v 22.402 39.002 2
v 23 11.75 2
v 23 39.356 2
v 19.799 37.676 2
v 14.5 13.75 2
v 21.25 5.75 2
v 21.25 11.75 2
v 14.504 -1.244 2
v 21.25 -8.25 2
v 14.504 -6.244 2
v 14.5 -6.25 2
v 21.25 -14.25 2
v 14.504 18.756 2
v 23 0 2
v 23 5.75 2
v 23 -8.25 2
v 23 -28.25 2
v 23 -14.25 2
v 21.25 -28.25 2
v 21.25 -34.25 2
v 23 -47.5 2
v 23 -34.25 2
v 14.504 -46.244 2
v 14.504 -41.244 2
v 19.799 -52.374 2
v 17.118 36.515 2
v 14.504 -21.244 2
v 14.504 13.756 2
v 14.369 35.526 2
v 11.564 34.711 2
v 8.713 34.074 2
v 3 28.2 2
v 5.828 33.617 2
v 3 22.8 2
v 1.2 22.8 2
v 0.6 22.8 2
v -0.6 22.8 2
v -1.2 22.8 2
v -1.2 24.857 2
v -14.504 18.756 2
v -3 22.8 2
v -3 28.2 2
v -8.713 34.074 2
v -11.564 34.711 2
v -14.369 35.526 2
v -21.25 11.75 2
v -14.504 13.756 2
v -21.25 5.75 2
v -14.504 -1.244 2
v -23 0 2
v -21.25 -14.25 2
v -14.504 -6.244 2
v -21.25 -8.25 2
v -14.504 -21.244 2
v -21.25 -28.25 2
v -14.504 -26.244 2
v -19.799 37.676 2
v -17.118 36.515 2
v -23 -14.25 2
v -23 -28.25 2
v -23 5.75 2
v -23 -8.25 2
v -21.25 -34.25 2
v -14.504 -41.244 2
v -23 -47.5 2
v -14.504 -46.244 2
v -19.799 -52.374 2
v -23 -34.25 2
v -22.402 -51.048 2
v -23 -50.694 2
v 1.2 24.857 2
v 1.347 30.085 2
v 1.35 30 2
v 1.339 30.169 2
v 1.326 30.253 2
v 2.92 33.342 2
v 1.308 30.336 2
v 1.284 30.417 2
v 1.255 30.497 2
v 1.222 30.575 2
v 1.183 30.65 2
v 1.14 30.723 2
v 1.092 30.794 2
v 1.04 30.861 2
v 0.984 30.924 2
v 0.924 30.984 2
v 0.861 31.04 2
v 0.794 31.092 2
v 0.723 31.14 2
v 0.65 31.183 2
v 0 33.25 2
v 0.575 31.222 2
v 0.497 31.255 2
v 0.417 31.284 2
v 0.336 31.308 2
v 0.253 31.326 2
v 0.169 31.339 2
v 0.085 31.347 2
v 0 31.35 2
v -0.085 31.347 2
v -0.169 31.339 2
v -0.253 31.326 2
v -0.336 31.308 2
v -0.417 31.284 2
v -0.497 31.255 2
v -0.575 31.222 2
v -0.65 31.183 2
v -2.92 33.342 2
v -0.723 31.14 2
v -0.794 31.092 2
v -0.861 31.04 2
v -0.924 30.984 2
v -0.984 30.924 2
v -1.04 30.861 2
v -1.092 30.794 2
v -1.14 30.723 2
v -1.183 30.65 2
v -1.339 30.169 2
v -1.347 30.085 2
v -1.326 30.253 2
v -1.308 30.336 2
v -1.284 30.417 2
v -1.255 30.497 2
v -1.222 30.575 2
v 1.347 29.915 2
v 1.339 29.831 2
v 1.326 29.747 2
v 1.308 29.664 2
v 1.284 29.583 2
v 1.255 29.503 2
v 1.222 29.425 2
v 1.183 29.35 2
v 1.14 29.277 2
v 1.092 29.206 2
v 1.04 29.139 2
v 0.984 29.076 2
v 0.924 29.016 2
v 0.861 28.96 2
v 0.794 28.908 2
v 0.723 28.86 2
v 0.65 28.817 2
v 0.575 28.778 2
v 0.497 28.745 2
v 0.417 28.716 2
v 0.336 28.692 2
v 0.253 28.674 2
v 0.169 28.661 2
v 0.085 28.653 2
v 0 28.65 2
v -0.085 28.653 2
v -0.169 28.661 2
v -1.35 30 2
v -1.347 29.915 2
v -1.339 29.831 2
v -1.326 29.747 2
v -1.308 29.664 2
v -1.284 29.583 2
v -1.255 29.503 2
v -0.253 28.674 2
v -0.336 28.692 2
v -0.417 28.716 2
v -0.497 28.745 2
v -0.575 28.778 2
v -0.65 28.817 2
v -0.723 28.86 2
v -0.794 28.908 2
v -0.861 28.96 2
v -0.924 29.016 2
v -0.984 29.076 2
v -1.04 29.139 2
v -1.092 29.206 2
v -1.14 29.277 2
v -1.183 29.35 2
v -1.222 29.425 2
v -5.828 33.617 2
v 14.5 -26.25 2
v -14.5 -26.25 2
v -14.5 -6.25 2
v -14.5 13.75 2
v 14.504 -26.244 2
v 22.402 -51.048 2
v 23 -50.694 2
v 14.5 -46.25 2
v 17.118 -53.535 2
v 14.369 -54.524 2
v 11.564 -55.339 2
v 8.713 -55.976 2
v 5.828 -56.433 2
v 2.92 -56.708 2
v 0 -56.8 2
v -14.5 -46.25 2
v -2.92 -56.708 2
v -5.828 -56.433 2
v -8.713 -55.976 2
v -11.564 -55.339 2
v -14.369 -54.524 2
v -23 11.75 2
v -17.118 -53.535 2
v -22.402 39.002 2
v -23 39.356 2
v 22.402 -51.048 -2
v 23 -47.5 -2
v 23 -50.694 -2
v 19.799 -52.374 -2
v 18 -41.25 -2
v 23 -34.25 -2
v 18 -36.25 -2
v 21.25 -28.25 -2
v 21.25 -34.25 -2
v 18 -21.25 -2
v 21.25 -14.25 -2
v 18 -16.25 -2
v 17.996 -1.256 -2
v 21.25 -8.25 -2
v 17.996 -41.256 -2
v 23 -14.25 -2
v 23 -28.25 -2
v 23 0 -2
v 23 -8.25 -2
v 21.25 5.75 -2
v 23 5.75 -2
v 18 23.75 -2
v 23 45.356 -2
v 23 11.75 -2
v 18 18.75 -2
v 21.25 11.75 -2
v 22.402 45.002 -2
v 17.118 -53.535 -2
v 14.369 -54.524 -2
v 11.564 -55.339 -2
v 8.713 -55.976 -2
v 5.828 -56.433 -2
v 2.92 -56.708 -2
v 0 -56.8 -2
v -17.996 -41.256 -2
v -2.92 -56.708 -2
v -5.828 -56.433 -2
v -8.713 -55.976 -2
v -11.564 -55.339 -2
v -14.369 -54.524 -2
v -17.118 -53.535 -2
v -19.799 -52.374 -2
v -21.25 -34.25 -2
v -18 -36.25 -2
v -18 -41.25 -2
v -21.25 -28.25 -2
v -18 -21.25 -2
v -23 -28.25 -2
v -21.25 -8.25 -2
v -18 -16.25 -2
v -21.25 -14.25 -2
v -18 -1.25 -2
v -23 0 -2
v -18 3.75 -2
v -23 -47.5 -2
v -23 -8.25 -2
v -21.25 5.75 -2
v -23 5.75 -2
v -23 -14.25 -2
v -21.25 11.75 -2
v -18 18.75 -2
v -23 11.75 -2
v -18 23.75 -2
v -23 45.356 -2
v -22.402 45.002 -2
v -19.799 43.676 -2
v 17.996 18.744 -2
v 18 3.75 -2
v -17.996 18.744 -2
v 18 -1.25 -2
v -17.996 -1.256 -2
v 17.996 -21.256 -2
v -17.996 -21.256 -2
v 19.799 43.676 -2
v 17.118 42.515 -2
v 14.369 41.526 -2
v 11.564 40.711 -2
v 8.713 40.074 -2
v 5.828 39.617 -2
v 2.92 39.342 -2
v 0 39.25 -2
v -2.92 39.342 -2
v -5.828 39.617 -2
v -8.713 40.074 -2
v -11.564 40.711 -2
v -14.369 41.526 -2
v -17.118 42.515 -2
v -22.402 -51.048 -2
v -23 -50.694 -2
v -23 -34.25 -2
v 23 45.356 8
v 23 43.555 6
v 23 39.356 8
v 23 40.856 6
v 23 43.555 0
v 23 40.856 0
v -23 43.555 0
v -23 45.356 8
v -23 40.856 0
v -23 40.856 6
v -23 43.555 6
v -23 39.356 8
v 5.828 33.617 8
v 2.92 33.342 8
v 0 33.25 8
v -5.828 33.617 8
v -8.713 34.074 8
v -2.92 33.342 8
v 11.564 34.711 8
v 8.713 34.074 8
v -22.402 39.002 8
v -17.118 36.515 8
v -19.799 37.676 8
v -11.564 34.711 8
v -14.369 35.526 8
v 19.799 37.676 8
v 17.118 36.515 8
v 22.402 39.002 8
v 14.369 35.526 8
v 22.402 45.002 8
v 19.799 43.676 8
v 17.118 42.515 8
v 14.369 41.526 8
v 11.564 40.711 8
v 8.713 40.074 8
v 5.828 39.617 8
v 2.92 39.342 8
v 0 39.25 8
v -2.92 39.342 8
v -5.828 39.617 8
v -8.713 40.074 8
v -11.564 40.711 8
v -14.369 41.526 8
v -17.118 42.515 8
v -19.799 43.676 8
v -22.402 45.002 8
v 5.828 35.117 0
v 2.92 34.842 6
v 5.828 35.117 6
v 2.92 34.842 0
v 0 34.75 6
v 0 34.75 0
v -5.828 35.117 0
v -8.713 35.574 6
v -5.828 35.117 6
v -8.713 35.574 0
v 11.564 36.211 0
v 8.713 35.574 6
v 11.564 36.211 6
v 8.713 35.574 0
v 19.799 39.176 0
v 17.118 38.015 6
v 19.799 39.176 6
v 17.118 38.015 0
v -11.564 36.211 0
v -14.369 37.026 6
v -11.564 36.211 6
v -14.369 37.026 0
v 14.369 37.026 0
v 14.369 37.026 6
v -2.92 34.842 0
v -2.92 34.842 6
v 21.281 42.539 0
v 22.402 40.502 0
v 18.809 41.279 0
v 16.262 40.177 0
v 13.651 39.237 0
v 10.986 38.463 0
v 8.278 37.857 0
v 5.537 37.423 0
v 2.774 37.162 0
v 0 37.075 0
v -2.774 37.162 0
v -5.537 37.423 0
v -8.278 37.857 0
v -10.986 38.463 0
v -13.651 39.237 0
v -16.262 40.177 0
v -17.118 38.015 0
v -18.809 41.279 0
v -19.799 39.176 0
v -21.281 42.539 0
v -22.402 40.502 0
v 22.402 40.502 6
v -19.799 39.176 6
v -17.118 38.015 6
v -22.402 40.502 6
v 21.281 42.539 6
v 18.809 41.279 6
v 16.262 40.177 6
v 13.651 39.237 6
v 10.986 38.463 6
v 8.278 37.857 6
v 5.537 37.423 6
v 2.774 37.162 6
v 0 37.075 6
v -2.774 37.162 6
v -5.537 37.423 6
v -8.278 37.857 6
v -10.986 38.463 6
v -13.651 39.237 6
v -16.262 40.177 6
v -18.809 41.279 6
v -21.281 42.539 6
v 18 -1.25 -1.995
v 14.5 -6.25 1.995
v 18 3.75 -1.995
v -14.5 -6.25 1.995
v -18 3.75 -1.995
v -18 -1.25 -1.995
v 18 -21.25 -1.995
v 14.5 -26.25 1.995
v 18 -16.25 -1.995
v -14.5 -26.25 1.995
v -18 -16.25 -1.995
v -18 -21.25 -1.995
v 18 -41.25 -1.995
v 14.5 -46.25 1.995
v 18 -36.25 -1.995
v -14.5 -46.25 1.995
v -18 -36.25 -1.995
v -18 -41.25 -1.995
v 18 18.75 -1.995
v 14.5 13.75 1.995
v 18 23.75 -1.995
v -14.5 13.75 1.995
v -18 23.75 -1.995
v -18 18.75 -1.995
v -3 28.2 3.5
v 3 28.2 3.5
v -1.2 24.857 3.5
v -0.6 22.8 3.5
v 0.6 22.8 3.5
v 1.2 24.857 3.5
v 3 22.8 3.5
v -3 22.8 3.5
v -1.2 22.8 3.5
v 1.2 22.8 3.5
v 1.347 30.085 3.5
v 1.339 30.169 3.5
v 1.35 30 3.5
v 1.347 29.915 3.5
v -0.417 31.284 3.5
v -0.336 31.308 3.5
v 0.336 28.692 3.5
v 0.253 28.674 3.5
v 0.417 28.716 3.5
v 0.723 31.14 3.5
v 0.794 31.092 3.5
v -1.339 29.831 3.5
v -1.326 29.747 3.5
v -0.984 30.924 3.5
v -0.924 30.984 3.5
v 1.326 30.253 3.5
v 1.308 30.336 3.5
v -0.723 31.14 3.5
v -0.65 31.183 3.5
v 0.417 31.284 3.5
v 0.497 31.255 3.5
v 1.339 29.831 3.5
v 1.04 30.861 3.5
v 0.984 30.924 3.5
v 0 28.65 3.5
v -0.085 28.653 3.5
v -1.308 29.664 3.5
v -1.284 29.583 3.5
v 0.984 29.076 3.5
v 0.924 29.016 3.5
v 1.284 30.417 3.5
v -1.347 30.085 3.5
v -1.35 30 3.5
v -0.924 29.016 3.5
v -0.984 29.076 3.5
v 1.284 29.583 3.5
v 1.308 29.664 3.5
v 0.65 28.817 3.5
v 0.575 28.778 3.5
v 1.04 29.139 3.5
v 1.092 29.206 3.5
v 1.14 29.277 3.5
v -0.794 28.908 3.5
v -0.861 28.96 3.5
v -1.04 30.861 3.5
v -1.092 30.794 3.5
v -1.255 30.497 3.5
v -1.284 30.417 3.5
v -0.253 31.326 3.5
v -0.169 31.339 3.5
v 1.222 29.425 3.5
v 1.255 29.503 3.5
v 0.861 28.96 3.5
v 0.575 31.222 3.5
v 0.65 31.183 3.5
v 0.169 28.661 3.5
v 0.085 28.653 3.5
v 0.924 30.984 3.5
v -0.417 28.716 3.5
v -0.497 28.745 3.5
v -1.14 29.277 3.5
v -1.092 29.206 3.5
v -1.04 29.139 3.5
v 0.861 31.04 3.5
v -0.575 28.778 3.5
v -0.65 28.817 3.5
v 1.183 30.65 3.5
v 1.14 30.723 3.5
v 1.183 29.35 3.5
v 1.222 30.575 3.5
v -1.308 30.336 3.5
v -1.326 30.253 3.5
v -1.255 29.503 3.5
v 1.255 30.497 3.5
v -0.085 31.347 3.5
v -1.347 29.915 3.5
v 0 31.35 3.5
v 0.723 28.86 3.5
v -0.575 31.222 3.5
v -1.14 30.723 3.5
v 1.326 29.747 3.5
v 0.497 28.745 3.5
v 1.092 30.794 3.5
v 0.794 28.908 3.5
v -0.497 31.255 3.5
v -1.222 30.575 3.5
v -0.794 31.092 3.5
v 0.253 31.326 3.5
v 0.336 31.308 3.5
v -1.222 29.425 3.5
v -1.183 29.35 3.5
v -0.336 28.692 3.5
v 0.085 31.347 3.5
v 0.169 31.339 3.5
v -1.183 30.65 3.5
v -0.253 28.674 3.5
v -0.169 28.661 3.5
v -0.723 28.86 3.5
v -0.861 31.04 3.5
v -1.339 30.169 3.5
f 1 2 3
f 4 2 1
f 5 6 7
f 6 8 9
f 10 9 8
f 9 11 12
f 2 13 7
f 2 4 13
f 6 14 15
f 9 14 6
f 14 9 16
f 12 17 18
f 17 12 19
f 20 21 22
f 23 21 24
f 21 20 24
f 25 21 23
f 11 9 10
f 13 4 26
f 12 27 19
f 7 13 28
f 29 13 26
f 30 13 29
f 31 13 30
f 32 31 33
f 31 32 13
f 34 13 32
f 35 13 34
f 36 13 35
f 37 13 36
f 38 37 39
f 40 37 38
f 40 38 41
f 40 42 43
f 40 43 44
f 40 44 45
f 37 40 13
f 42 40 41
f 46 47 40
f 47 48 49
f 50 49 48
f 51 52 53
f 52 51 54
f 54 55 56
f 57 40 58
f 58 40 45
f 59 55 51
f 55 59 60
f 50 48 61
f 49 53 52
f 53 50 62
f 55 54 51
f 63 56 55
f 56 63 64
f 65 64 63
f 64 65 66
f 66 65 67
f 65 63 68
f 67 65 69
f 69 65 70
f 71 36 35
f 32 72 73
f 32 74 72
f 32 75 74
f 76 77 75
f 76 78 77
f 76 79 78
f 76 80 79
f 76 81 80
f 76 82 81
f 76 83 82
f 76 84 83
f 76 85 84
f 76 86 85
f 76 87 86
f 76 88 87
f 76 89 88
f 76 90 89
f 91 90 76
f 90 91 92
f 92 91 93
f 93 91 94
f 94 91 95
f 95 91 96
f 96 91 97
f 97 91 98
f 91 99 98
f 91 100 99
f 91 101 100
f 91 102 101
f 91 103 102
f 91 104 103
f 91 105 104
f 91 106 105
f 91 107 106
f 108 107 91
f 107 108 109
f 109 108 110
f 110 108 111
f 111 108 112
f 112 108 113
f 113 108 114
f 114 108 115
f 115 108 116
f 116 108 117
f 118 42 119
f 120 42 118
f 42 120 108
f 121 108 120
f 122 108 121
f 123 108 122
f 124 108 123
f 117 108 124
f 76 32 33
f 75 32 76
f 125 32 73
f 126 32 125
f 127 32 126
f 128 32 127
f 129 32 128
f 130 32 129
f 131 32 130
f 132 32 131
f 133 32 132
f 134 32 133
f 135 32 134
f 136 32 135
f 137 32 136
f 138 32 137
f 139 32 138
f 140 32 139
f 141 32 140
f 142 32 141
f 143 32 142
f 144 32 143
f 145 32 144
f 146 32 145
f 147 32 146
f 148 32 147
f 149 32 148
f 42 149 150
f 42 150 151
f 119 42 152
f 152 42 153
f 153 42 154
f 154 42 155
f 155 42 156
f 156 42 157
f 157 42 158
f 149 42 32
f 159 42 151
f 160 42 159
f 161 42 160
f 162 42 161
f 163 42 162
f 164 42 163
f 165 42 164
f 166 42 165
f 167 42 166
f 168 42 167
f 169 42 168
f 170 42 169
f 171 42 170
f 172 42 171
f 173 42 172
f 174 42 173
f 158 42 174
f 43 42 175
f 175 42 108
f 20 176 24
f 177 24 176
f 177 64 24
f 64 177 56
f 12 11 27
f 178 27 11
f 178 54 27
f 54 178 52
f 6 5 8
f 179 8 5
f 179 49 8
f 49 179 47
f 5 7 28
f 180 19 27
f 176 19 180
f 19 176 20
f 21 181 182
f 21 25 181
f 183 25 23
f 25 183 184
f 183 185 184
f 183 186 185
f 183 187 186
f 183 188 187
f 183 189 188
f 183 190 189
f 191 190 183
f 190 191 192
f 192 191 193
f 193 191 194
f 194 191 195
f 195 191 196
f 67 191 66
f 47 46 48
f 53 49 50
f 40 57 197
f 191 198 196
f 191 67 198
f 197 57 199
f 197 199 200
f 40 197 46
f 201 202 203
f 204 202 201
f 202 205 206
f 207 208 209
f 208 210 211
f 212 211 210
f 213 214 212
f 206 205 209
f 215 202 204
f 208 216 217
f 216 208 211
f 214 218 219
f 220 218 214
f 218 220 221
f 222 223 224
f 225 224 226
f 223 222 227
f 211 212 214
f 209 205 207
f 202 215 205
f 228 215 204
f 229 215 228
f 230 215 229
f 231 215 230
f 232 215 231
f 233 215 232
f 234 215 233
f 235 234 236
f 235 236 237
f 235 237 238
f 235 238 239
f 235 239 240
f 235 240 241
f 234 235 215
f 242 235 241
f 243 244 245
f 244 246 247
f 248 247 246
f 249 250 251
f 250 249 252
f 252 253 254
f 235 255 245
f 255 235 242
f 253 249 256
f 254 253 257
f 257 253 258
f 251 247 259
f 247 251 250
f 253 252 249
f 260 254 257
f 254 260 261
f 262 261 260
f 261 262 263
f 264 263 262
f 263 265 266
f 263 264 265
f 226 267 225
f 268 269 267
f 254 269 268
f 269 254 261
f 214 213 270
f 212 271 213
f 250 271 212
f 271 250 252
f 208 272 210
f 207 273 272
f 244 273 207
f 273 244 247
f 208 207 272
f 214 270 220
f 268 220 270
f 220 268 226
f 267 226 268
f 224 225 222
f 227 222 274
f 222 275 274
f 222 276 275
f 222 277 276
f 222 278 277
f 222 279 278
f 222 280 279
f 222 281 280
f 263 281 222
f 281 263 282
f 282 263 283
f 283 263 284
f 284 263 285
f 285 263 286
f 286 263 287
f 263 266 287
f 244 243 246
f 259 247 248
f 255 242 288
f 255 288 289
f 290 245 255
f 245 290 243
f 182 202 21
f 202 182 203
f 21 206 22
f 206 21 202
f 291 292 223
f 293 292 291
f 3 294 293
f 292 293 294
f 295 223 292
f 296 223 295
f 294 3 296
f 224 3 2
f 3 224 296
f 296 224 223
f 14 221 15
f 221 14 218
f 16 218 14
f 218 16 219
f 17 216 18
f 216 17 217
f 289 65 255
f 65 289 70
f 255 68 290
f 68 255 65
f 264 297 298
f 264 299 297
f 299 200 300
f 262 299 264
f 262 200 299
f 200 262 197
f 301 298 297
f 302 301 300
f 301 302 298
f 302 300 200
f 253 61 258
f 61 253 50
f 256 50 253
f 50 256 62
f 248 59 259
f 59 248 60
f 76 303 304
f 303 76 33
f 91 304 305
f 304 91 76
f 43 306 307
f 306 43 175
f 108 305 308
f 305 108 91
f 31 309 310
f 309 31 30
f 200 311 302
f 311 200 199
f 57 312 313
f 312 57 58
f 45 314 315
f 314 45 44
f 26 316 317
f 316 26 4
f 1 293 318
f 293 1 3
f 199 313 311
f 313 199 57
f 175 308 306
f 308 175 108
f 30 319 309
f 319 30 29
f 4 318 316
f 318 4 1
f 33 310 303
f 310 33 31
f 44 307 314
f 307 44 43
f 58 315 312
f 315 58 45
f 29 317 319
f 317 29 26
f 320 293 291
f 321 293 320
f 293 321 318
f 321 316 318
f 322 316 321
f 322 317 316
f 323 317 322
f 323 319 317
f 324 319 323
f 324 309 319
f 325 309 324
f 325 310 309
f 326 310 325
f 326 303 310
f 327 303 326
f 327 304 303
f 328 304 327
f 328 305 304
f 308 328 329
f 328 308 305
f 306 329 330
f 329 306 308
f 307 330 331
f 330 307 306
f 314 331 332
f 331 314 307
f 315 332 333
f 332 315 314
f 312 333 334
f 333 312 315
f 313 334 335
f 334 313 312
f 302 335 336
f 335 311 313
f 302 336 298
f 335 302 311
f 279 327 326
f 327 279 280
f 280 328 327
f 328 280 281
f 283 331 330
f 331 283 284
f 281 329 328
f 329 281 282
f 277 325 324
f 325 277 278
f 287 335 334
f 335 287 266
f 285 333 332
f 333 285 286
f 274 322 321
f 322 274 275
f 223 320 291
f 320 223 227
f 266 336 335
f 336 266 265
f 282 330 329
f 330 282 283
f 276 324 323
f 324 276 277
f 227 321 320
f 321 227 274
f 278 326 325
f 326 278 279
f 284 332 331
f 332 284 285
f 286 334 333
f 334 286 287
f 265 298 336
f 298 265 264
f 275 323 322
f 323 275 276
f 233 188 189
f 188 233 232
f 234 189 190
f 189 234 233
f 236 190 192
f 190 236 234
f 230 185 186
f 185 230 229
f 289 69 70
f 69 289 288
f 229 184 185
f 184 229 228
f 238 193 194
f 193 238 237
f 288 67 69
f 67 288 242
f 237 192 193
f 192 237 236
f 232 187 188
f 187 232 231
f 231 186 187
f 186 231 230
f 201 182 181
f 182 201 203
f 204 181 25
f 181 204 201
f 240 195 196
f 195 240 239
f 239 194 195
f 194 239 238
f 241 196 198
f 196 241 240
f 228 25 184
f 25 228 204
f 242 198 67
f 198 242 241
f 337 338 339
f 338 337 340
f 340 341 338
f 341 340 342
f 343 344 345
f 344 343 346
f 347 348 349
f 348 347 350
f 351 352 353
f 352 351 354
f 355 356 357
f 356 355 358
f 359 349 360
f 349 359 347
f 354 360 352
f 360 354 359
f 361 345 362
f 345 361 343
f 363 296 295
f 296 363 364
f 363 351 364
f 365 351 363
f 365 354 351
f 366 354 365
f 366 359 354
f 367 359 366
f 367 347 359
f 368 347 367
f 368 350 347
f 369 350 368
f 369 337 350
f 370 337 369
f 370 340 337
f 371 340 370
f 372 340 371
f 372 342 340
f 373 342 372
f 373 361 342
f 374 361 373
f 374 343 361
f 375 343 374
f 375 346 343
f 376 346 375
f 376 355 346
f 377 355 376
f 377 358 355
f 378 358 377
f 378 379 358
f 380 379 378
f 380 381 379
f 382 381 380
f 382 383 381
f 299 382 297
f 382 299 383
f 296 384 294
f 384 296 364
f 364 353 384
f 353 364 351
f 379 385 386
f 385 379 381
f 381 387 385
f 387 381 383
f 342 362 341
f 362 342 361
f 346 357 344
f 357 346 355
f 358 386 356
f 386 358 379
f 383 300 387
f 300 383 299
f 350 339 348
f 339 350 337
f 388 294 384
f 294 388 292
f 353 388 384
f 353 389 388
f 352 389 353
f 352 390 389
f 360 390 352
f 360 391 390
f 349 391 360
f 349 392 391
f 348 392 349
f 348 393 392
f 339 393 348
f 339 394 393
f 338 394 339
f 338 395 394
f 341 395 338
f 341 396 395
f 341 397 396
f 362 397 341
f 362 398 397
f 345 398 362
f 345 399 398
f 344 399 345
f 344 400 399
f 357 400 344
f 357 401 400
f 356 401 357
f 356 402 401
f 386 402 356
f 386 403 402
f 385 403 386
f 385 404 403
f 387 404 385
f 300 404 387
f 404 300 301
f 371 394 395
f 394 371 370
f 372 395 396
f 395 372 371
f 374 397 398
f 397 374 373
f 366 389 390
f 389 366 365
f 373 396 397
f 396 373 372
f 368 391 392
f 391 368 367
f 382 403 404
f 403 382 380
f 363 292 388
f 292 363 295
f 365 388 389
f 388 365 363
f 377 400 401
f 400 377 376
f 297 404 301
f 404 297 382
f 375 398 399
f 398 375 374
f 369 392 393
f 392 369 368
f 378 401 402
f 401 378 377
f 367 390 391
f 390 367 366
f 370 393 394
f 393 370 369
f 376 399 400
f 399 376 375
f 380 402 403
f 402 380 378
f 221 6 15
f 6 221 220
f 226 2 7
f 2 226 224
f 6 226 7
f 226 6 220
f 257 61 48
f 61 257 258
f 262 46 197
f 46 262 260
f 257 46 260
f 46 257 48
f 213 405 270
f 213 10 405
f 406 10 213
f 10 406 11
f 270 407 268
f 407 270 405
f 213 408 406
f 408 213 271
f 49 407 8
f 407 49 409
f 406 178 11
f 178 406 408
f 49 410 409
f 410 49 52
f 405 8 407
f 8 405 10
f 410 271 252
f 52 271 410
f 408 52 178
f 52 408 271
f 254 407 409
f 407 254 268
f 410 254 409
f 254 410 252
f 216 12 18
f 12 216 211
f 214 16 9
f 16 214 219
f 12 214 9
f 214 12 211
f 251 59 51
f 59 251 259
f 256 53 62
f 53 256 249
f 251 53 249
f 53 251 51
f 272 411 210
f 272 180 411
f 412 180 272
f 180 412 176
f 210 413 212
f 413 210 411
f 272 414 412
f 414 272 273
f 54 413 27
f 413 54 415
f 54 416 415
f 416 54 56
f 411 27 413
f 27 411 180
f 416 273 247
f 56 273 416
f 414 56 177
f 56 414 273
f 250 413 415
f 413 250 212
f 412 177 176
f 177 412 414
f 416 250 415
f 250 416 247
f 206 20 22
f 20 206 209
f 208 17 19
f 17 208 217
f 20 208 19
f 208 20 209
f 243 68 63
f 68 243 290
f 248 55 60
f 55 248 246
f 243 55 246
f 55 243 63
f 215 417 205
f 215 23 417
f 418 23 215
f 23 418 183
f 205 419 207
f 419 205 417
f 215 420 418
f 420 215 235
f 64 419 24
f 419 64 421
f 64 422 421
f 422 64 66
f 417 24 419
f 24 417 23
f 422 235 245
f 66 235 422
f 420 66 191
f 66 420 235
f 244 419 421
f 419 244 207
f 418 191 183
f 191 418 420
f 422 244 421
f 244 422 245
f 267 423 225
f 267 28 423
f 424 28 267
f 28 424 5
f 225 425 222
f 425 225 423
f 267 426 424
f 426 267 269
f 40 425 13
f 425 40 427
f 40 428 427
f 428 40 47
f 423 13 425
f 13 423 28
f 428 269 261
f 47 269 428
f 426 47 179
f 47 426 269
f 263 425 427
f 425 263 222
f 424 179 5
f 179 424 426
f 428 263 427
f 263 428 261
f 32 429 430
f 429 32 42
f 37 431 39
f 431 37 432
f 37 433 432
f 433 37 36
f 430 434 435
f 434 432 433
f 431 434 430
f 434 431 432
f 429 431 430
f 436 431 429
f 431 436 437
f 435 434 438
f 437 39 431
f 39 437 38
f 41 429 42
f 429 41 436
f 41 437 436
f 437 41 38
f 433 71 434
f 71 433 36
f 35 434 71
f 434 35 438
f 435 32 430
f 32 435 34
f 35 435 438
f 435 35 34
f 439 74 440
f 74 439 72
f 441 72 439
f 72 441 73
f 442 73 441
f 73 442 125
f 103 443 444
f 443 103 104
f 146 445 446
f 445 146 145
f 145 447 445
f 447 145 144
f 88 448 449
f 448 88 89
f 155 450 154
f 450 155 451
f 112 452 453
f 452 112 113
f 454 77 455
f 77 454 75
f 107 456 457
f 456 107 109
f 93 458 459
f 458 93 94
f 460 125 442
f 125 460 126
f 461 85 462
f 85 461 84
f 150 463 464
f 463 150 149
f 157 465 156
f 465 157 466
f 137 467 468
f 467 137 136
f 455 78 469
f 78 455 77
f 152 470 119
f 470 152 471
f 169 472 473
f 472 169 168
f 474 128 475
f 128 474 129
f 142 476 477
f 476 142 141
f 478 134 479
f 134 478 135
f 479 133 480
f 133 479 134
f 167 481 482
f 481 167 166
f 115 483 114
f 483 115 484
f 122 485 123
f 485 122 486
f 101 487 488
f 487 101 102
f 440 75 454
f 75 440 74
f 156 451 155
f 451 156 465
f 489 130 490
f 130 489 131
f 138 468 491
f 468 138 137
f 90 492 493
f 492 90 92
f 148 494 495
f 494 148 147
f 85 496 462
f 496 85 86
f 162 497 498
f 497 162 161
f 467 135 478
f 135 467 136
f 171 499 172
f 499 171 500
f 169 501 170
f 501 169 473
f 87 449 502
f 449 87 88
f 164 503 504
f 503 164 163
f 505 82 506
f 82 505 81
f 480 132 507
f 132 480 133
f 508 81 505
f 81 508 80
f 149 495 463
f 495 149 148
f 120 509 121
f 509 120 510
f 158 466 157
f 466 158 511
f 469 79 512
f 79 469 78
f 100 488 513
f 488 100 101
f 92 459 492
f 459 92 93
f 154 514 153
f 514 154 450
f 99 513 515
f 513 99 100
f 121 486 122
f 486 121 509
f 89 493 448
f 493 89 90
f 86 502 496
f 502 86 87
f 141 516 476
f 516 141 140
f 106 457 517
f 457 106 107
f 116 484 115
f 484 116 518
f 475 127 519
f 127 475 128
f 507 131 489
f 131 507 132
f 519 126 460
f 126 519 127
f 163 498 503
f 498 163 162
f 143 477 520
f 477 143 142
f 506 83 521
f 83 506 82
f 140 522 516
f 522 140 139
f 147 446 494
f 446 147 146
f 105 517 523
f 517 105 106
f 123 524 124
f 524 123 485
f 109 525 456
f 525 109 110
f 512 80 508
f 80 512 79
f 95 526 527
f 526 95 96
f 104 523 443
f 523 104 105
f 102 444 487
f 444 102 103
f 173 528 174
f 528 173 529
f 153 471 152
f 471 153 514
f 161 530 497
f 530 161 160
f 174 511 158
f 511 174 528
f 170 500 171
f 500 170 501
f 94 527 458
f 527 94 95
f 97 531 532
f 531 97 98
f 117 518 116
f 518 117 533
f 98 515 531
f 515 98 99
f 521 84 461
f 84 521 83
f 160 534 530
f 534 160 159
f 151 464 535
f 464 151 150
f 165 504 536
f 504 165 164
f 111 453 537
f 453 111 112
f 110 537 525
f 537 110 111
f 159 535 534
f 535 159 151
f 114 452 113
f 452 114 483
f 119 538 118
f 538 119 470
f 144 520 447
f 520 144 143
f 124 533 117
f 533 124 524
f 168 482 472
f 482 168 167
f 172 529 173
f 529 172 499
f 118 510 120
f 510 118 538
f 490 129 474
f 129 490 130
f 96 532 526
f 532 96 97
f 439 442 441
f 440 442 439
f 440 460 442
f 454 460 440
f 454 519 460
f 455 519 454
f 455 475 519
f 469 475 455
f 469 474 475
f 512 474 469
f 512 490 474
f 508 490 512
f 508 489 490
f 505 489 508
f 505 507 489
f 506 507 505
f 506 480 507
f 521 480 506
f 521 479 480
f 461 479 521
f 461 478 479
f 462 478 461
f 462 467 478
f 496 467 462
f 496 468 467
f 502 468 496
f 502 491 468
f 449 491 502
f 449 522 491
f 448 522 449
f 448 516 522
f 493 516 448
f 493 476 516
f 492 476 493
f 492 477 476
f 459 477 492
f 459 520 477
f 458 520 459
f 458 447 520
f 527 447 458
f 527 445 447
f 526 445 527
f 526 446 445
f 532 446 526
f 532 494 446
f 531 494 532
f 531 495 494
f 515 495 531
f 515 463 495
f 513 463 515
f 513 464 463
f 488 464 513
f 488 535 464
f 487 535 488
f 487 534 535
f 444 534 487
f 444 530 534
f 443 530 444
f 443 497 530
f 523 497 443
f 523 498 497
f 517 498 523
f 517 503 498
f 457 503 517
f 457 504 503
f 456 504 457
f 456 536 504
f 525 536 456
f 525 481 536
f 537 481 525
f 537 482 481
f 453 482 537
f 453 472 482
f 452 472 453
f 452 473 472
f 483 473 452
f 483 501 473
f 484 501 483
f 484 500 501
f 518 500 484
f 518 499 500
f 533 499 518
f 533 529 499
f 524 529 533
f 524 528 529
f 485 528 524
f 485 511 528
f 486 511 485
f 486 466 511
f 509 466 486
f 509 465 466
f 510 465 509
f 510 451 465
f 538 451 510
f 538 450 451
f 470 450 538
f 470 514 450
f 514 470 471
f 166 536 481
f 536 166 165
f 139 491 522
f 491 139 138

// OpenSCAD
$fn = 100;

gels = 4;
gel_width = 36; //431
gel_cut_width = 29;
gel_opening = 5;
gel_spacing = 15;

ladder_margin = 15;
ladder_length = gel_opening * gels + gel_spacing * (gels - 1) + ladder_margin * 2;
ladder_width = gel_width + gel_opening * 2;
ladder_thickness = 4;
ladder_round = 1;

stem_diameter = 46.5;
stem_radius = stem_diameter / 2;

zip_thickness = 1.5;
zip_width = 3.5;
zip_height = 6;

logo_head = 10;
logo_m_thick = 6;
logo_m_thin = 4;

module slot() {
    translate([0, 0, -(ladder_thickness / 2)]) {
        hull() {
            cube([gel_opening, gel_width, 0.01], true);
            translate([gel_opening, 0, ladder_thickness]) {
                cube([gel_opening, gel_cut_width, 0.01], true);
            }
        }
    }
}

module ladder() {
    difference() {
        union() {
            // initial ladder
            cube([ladder_length, ladder_width, ladder_thickness], true);
            
            // add on the front ring for the zip tie
            translate([-(ladder_length / 2 + stem_radius + ladder_margin) + zip_height, 0, zip_height / 2]) {
                    cylinder(ladder_thickness + zip_height, stem_diameter, stem_diameter, true);
            }        
        }
        
        translate([-(ladder_length / 2 + stem_radius + ladder_margin), 0, 0]) {
            cylinder(ladder_thickness * 5, stem_diameter, stem_diameter, true);
        }

        translate([-ladder_length, ladder_width, 0]) {
            cube([ladder_length * 2, ladder_width, ladder_thickness * 5], true);
        }

        translate([-ladder_length, -ladder_width, 0]) {
            cube([ladder_length * 2, ladder_width, ladder_thickness * 5], true);
        }
    }
    

    // round off the end of the ladder
    difference() {
        translate([ladder_length / 2 - stem_diameter * .8, 0, 0]) {
            cylinder(ladder_thickness, stem_diameter, stem_diameter, true);
        }
        translate([0, ladder_width, 0]) {
            cube([ladder_length * 10, ladder_width, ladder_thickness + .1], true);
        }
        translate([0, -ladder_width, 0]) {
            cube([ladder_length * 10, ladder_width, ladder_thickness + .1], true);
        }
    }

}

module stemzip() {
    difference() {
        cylinder(zip_height, stem_diameter, stem_diameter, true);
        scale([.95, .95, .95]) {
            cylinder(zip_height * 2, stem_diameter, stem_diameter, true);
        }
    }
}


// showtime!
module main() {
    difference() {
        ladder();
        translate([-(ladder_length / 2 + stem_radius + ladder_margin) + zip_height - zip_thickness, 0, zip_height / 2]) {
            stemzip();
        }    
        for (offset = [0: gels - 1]) {
            translate([(gel_opening + gel_spacing) * offset - ladder_length / 2 + ladder_margin * 1.75, 0, 0]) {
                slot();
                if (offset > 0) {
                    translate([- (gel_spacing / 2), ladder_width / 2, 0]) {
                        cube([zip_height, zip_width, ladder_thickness * 2], true);
                    }
                    translate([- (gel_spacing / 2), -ladder_width / 2, 0]) {
                        cube([zip_height, zip_width, ladder_thickness * 2], true);
                    }
                }
            }

        }
    }
}

module logo_half() {
    translate([0, -(logo_m_thick / 2 + 6), 0]) {    
        hull() {
            
            translate([-(logo_m_thick * 1), 4.5, 0]) {
                cube([logo_m_thick, logo_m_thick, logo_head], true);
            }
         
            translate([logo_m_thick + (logo_m_thick - logo_m_thin) / 2, 7, 0]) {
                cube([logo_m_thin, logo_m_thin, logo_head], true) {
                }
            }
        }
        translate([-(logo_m_thick * 1), 0, 0]) {
            cube([logo_m_thick, logo_m_thick, logo_head], true);
        }
        
        translate([0, 0, 0]) {
            cube([logo_m_thick * 3, logo_m_thick, logo_head], true);
        }
    }
}

module logo() {
    translate([0, logo_m_thick * 3 - 3, 0]) {
        cylinder(logo_head, 4.5, 4.5, true);
    }
    rotate([0, 0, -90]) {
        translate([0, logo_m_thin / 2, 0]) {
            logo_half();
        }
        translate([0, -(logo_m_thin / 2), 0]) {
            mirror([0, 1, 0]) {
                logo_half();
            }
        }
    }
}


rotate([0, 0, -90]) {
    main();
}

translate([0, ladder_length / 2 - ladder_margin - gel_spacing + 8, 2]) {
    scale([.3, .3, .3]) {
        logo();
    }
}
